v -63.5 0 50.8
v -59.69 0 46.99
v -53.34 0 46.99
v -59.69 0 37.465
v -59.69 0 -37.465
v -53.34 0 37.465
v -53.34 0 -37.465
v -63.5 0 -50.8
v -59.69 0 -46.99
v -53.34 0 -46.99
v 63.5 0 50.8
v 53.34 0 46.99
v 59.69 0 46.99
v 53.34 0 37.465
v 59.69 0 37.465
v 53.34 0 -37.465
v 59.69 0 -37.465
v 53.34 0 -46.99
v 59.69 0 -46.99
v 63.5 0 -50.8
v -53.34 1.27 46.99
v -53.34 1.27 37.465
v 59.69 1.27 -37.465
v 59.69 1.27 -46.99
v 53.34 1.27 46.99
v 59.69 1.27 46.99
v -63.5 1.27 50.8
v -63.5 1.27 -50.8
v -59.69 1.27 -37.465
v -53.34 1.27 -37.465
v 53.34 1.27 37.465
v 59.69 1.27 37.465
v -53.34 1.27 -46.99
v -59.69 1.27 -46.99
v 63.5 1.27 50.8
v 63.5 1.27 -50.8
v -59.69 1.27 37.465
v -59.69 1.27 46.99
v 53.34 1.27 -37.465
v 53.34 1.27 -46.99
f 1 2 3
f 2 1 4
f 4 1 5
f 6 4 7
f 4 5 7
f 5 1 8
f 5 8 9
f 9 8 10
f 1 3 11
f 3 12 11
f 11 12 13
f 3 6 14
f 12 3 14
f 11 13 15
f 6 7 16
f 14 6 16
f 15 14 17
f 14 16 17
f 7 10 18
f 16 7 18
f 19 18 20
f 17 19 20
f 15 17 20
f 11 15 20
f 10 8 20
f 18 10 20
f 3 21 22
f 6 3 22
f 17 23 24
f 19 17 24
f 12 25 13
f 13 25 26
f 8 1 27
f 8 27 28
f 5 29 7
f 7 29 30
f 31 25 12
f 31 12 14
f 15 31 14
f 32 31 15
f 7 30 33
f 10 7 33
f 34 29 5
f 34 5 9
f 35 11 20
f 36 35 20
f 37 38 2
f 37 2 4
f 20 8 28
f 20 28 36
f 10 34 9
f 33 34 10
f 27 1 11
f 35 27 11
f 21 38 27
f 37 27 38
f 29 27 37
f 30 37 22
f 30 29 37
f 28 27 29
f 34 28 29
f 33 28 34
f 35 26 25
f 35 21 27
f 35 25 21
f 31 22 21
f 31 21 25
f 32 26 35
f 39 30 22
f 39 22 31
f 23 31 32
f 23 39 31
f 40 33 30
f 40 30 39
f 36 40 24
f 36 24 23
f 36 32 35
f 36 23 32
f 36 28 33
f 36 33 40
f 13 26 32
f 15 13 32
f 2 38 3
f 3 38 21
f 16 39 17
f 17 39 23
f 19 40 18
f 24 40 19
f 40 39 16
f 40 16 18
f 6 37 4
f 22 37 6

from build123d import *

# Parameters (mm, degrees)
SKETCH1_W           = 127
SKETCH1_H           = 101.6
BOSS_EXTRUDE1_DEPTH = 1.27
CUT_EXTRUDE1_REACH  = 83.33
SKETCH2_W           = 6.35
SKETCH2_H           = 9.525


with BuildPart() as part:
    # Sketch1 → Boss-Extrude1 (new body)
    with BuildSketch(Plane(origin=(0, 0, 0), x_dir=(1, 0, 0), z_dir=(0, 1, 0))):
        Rectangle(SKETCH1_W, SKETCH1_H)
    extrude(amount=BOSS_EXTRUDE1_DEPTH)

    # Sketch2 → Cut-Extrude1 (cut, up to next)
    with BuildSketch(Plane(origin=(0, 1.27, 0), x_dir=(1, 0, 0), z_dir=(0, 1, 0)), mode=Mode.PRIVATE) as cut_extrude1_sk1:
        with Locations((-56.515, 42.2275)):
            Rectangle(SKETCH2_W, SKETCH2_H)
    cut_extrude1_tool1 = extrude(cut_extrude1_sk1.sketch, amount=-CUT_EXTRUDE1_REACH, mode=Mode.PRIVATE) & part.part
    # Sketch2 → Cut-Extrude1 (cut, up to next)
    with BuildSketch(Plane(origin=(0, 1.27, 0), x_dir=(1, 0, 0), z_dir=(0, 1, 0)), mode=Mode.PRIVATE) as cut_extrude1_sk2:
        with Locations((56.515, 42.2275)):
            Rectangle(SKETCH2_W, SKETCH2_H)
    cut_extrude1_tool2 = extrude(cut_extrude1_sk2.sketch, amount=-CUT_EXTRUDE1_REACH, mode=Mode.PRIVATE) & part.part
    # Sketch2 → Cut-Extrude1 (cut, up to next)
    with BuildSketch(Plane(origin=(0, 1.27, 0), x_dir=(1, 0, 0), z_dir=(0, 1, 0)), mode=Mode.PRIVATE) as cut_extrude1_sk3:
        with Locations((56.515, -42.2275)):
            Rectangle(SKETCH2_W, SKETCH2_H)
    cut_extrude1_tool3 = extrude(cut_extrude1_sk3.sketch, amount=-CUT_EXTRUDE1_REACH, mode=Mode.PRIVATE) & part.part
    # Sketch2 → Cut-Extrude1 (cut, up to next)
    with BuildSketch(Plane(origin=(0, 1.27, 0), x_dir=(1, 0, 0), z_dir=(0, 1, 0)), mode=Mode.PRIVATE) as cut_extrude1_sk4:
        with Locations((-56.515, -42.2275)):
            Rectangle(SKETCH2_W, SKETCH2_H)
    cut_extrude1_tool4 = extrude(cut_extrude1_sk4.sketch, amount=-CUT_EXTRUDE1_REACH, mode=Mode.PRIVATE) & part.part
    add(cut_extrude1_tool1.solids().sort_by_distance((-56.515, 1.27, -42.2275))[0], mode=Mode.SUBTRACT)
    add(cut_extrude1_tool2.solids().sort_by_distance((56.515, 1.27, -42.2275))[0], mode=Mode.SUBTRACT)
    add(cut_extrude1_tool3.solids().sort_by_distance((56.515, 1.27, 42.2275))[0], mode=Mode.SUBTRACT)
    add(cut_extrude1_tool4.solids().sort_by_distance((-56.515, 1.27, 42.2275))[0], mode=Mode.SUBTRACT)


solid = part.part
